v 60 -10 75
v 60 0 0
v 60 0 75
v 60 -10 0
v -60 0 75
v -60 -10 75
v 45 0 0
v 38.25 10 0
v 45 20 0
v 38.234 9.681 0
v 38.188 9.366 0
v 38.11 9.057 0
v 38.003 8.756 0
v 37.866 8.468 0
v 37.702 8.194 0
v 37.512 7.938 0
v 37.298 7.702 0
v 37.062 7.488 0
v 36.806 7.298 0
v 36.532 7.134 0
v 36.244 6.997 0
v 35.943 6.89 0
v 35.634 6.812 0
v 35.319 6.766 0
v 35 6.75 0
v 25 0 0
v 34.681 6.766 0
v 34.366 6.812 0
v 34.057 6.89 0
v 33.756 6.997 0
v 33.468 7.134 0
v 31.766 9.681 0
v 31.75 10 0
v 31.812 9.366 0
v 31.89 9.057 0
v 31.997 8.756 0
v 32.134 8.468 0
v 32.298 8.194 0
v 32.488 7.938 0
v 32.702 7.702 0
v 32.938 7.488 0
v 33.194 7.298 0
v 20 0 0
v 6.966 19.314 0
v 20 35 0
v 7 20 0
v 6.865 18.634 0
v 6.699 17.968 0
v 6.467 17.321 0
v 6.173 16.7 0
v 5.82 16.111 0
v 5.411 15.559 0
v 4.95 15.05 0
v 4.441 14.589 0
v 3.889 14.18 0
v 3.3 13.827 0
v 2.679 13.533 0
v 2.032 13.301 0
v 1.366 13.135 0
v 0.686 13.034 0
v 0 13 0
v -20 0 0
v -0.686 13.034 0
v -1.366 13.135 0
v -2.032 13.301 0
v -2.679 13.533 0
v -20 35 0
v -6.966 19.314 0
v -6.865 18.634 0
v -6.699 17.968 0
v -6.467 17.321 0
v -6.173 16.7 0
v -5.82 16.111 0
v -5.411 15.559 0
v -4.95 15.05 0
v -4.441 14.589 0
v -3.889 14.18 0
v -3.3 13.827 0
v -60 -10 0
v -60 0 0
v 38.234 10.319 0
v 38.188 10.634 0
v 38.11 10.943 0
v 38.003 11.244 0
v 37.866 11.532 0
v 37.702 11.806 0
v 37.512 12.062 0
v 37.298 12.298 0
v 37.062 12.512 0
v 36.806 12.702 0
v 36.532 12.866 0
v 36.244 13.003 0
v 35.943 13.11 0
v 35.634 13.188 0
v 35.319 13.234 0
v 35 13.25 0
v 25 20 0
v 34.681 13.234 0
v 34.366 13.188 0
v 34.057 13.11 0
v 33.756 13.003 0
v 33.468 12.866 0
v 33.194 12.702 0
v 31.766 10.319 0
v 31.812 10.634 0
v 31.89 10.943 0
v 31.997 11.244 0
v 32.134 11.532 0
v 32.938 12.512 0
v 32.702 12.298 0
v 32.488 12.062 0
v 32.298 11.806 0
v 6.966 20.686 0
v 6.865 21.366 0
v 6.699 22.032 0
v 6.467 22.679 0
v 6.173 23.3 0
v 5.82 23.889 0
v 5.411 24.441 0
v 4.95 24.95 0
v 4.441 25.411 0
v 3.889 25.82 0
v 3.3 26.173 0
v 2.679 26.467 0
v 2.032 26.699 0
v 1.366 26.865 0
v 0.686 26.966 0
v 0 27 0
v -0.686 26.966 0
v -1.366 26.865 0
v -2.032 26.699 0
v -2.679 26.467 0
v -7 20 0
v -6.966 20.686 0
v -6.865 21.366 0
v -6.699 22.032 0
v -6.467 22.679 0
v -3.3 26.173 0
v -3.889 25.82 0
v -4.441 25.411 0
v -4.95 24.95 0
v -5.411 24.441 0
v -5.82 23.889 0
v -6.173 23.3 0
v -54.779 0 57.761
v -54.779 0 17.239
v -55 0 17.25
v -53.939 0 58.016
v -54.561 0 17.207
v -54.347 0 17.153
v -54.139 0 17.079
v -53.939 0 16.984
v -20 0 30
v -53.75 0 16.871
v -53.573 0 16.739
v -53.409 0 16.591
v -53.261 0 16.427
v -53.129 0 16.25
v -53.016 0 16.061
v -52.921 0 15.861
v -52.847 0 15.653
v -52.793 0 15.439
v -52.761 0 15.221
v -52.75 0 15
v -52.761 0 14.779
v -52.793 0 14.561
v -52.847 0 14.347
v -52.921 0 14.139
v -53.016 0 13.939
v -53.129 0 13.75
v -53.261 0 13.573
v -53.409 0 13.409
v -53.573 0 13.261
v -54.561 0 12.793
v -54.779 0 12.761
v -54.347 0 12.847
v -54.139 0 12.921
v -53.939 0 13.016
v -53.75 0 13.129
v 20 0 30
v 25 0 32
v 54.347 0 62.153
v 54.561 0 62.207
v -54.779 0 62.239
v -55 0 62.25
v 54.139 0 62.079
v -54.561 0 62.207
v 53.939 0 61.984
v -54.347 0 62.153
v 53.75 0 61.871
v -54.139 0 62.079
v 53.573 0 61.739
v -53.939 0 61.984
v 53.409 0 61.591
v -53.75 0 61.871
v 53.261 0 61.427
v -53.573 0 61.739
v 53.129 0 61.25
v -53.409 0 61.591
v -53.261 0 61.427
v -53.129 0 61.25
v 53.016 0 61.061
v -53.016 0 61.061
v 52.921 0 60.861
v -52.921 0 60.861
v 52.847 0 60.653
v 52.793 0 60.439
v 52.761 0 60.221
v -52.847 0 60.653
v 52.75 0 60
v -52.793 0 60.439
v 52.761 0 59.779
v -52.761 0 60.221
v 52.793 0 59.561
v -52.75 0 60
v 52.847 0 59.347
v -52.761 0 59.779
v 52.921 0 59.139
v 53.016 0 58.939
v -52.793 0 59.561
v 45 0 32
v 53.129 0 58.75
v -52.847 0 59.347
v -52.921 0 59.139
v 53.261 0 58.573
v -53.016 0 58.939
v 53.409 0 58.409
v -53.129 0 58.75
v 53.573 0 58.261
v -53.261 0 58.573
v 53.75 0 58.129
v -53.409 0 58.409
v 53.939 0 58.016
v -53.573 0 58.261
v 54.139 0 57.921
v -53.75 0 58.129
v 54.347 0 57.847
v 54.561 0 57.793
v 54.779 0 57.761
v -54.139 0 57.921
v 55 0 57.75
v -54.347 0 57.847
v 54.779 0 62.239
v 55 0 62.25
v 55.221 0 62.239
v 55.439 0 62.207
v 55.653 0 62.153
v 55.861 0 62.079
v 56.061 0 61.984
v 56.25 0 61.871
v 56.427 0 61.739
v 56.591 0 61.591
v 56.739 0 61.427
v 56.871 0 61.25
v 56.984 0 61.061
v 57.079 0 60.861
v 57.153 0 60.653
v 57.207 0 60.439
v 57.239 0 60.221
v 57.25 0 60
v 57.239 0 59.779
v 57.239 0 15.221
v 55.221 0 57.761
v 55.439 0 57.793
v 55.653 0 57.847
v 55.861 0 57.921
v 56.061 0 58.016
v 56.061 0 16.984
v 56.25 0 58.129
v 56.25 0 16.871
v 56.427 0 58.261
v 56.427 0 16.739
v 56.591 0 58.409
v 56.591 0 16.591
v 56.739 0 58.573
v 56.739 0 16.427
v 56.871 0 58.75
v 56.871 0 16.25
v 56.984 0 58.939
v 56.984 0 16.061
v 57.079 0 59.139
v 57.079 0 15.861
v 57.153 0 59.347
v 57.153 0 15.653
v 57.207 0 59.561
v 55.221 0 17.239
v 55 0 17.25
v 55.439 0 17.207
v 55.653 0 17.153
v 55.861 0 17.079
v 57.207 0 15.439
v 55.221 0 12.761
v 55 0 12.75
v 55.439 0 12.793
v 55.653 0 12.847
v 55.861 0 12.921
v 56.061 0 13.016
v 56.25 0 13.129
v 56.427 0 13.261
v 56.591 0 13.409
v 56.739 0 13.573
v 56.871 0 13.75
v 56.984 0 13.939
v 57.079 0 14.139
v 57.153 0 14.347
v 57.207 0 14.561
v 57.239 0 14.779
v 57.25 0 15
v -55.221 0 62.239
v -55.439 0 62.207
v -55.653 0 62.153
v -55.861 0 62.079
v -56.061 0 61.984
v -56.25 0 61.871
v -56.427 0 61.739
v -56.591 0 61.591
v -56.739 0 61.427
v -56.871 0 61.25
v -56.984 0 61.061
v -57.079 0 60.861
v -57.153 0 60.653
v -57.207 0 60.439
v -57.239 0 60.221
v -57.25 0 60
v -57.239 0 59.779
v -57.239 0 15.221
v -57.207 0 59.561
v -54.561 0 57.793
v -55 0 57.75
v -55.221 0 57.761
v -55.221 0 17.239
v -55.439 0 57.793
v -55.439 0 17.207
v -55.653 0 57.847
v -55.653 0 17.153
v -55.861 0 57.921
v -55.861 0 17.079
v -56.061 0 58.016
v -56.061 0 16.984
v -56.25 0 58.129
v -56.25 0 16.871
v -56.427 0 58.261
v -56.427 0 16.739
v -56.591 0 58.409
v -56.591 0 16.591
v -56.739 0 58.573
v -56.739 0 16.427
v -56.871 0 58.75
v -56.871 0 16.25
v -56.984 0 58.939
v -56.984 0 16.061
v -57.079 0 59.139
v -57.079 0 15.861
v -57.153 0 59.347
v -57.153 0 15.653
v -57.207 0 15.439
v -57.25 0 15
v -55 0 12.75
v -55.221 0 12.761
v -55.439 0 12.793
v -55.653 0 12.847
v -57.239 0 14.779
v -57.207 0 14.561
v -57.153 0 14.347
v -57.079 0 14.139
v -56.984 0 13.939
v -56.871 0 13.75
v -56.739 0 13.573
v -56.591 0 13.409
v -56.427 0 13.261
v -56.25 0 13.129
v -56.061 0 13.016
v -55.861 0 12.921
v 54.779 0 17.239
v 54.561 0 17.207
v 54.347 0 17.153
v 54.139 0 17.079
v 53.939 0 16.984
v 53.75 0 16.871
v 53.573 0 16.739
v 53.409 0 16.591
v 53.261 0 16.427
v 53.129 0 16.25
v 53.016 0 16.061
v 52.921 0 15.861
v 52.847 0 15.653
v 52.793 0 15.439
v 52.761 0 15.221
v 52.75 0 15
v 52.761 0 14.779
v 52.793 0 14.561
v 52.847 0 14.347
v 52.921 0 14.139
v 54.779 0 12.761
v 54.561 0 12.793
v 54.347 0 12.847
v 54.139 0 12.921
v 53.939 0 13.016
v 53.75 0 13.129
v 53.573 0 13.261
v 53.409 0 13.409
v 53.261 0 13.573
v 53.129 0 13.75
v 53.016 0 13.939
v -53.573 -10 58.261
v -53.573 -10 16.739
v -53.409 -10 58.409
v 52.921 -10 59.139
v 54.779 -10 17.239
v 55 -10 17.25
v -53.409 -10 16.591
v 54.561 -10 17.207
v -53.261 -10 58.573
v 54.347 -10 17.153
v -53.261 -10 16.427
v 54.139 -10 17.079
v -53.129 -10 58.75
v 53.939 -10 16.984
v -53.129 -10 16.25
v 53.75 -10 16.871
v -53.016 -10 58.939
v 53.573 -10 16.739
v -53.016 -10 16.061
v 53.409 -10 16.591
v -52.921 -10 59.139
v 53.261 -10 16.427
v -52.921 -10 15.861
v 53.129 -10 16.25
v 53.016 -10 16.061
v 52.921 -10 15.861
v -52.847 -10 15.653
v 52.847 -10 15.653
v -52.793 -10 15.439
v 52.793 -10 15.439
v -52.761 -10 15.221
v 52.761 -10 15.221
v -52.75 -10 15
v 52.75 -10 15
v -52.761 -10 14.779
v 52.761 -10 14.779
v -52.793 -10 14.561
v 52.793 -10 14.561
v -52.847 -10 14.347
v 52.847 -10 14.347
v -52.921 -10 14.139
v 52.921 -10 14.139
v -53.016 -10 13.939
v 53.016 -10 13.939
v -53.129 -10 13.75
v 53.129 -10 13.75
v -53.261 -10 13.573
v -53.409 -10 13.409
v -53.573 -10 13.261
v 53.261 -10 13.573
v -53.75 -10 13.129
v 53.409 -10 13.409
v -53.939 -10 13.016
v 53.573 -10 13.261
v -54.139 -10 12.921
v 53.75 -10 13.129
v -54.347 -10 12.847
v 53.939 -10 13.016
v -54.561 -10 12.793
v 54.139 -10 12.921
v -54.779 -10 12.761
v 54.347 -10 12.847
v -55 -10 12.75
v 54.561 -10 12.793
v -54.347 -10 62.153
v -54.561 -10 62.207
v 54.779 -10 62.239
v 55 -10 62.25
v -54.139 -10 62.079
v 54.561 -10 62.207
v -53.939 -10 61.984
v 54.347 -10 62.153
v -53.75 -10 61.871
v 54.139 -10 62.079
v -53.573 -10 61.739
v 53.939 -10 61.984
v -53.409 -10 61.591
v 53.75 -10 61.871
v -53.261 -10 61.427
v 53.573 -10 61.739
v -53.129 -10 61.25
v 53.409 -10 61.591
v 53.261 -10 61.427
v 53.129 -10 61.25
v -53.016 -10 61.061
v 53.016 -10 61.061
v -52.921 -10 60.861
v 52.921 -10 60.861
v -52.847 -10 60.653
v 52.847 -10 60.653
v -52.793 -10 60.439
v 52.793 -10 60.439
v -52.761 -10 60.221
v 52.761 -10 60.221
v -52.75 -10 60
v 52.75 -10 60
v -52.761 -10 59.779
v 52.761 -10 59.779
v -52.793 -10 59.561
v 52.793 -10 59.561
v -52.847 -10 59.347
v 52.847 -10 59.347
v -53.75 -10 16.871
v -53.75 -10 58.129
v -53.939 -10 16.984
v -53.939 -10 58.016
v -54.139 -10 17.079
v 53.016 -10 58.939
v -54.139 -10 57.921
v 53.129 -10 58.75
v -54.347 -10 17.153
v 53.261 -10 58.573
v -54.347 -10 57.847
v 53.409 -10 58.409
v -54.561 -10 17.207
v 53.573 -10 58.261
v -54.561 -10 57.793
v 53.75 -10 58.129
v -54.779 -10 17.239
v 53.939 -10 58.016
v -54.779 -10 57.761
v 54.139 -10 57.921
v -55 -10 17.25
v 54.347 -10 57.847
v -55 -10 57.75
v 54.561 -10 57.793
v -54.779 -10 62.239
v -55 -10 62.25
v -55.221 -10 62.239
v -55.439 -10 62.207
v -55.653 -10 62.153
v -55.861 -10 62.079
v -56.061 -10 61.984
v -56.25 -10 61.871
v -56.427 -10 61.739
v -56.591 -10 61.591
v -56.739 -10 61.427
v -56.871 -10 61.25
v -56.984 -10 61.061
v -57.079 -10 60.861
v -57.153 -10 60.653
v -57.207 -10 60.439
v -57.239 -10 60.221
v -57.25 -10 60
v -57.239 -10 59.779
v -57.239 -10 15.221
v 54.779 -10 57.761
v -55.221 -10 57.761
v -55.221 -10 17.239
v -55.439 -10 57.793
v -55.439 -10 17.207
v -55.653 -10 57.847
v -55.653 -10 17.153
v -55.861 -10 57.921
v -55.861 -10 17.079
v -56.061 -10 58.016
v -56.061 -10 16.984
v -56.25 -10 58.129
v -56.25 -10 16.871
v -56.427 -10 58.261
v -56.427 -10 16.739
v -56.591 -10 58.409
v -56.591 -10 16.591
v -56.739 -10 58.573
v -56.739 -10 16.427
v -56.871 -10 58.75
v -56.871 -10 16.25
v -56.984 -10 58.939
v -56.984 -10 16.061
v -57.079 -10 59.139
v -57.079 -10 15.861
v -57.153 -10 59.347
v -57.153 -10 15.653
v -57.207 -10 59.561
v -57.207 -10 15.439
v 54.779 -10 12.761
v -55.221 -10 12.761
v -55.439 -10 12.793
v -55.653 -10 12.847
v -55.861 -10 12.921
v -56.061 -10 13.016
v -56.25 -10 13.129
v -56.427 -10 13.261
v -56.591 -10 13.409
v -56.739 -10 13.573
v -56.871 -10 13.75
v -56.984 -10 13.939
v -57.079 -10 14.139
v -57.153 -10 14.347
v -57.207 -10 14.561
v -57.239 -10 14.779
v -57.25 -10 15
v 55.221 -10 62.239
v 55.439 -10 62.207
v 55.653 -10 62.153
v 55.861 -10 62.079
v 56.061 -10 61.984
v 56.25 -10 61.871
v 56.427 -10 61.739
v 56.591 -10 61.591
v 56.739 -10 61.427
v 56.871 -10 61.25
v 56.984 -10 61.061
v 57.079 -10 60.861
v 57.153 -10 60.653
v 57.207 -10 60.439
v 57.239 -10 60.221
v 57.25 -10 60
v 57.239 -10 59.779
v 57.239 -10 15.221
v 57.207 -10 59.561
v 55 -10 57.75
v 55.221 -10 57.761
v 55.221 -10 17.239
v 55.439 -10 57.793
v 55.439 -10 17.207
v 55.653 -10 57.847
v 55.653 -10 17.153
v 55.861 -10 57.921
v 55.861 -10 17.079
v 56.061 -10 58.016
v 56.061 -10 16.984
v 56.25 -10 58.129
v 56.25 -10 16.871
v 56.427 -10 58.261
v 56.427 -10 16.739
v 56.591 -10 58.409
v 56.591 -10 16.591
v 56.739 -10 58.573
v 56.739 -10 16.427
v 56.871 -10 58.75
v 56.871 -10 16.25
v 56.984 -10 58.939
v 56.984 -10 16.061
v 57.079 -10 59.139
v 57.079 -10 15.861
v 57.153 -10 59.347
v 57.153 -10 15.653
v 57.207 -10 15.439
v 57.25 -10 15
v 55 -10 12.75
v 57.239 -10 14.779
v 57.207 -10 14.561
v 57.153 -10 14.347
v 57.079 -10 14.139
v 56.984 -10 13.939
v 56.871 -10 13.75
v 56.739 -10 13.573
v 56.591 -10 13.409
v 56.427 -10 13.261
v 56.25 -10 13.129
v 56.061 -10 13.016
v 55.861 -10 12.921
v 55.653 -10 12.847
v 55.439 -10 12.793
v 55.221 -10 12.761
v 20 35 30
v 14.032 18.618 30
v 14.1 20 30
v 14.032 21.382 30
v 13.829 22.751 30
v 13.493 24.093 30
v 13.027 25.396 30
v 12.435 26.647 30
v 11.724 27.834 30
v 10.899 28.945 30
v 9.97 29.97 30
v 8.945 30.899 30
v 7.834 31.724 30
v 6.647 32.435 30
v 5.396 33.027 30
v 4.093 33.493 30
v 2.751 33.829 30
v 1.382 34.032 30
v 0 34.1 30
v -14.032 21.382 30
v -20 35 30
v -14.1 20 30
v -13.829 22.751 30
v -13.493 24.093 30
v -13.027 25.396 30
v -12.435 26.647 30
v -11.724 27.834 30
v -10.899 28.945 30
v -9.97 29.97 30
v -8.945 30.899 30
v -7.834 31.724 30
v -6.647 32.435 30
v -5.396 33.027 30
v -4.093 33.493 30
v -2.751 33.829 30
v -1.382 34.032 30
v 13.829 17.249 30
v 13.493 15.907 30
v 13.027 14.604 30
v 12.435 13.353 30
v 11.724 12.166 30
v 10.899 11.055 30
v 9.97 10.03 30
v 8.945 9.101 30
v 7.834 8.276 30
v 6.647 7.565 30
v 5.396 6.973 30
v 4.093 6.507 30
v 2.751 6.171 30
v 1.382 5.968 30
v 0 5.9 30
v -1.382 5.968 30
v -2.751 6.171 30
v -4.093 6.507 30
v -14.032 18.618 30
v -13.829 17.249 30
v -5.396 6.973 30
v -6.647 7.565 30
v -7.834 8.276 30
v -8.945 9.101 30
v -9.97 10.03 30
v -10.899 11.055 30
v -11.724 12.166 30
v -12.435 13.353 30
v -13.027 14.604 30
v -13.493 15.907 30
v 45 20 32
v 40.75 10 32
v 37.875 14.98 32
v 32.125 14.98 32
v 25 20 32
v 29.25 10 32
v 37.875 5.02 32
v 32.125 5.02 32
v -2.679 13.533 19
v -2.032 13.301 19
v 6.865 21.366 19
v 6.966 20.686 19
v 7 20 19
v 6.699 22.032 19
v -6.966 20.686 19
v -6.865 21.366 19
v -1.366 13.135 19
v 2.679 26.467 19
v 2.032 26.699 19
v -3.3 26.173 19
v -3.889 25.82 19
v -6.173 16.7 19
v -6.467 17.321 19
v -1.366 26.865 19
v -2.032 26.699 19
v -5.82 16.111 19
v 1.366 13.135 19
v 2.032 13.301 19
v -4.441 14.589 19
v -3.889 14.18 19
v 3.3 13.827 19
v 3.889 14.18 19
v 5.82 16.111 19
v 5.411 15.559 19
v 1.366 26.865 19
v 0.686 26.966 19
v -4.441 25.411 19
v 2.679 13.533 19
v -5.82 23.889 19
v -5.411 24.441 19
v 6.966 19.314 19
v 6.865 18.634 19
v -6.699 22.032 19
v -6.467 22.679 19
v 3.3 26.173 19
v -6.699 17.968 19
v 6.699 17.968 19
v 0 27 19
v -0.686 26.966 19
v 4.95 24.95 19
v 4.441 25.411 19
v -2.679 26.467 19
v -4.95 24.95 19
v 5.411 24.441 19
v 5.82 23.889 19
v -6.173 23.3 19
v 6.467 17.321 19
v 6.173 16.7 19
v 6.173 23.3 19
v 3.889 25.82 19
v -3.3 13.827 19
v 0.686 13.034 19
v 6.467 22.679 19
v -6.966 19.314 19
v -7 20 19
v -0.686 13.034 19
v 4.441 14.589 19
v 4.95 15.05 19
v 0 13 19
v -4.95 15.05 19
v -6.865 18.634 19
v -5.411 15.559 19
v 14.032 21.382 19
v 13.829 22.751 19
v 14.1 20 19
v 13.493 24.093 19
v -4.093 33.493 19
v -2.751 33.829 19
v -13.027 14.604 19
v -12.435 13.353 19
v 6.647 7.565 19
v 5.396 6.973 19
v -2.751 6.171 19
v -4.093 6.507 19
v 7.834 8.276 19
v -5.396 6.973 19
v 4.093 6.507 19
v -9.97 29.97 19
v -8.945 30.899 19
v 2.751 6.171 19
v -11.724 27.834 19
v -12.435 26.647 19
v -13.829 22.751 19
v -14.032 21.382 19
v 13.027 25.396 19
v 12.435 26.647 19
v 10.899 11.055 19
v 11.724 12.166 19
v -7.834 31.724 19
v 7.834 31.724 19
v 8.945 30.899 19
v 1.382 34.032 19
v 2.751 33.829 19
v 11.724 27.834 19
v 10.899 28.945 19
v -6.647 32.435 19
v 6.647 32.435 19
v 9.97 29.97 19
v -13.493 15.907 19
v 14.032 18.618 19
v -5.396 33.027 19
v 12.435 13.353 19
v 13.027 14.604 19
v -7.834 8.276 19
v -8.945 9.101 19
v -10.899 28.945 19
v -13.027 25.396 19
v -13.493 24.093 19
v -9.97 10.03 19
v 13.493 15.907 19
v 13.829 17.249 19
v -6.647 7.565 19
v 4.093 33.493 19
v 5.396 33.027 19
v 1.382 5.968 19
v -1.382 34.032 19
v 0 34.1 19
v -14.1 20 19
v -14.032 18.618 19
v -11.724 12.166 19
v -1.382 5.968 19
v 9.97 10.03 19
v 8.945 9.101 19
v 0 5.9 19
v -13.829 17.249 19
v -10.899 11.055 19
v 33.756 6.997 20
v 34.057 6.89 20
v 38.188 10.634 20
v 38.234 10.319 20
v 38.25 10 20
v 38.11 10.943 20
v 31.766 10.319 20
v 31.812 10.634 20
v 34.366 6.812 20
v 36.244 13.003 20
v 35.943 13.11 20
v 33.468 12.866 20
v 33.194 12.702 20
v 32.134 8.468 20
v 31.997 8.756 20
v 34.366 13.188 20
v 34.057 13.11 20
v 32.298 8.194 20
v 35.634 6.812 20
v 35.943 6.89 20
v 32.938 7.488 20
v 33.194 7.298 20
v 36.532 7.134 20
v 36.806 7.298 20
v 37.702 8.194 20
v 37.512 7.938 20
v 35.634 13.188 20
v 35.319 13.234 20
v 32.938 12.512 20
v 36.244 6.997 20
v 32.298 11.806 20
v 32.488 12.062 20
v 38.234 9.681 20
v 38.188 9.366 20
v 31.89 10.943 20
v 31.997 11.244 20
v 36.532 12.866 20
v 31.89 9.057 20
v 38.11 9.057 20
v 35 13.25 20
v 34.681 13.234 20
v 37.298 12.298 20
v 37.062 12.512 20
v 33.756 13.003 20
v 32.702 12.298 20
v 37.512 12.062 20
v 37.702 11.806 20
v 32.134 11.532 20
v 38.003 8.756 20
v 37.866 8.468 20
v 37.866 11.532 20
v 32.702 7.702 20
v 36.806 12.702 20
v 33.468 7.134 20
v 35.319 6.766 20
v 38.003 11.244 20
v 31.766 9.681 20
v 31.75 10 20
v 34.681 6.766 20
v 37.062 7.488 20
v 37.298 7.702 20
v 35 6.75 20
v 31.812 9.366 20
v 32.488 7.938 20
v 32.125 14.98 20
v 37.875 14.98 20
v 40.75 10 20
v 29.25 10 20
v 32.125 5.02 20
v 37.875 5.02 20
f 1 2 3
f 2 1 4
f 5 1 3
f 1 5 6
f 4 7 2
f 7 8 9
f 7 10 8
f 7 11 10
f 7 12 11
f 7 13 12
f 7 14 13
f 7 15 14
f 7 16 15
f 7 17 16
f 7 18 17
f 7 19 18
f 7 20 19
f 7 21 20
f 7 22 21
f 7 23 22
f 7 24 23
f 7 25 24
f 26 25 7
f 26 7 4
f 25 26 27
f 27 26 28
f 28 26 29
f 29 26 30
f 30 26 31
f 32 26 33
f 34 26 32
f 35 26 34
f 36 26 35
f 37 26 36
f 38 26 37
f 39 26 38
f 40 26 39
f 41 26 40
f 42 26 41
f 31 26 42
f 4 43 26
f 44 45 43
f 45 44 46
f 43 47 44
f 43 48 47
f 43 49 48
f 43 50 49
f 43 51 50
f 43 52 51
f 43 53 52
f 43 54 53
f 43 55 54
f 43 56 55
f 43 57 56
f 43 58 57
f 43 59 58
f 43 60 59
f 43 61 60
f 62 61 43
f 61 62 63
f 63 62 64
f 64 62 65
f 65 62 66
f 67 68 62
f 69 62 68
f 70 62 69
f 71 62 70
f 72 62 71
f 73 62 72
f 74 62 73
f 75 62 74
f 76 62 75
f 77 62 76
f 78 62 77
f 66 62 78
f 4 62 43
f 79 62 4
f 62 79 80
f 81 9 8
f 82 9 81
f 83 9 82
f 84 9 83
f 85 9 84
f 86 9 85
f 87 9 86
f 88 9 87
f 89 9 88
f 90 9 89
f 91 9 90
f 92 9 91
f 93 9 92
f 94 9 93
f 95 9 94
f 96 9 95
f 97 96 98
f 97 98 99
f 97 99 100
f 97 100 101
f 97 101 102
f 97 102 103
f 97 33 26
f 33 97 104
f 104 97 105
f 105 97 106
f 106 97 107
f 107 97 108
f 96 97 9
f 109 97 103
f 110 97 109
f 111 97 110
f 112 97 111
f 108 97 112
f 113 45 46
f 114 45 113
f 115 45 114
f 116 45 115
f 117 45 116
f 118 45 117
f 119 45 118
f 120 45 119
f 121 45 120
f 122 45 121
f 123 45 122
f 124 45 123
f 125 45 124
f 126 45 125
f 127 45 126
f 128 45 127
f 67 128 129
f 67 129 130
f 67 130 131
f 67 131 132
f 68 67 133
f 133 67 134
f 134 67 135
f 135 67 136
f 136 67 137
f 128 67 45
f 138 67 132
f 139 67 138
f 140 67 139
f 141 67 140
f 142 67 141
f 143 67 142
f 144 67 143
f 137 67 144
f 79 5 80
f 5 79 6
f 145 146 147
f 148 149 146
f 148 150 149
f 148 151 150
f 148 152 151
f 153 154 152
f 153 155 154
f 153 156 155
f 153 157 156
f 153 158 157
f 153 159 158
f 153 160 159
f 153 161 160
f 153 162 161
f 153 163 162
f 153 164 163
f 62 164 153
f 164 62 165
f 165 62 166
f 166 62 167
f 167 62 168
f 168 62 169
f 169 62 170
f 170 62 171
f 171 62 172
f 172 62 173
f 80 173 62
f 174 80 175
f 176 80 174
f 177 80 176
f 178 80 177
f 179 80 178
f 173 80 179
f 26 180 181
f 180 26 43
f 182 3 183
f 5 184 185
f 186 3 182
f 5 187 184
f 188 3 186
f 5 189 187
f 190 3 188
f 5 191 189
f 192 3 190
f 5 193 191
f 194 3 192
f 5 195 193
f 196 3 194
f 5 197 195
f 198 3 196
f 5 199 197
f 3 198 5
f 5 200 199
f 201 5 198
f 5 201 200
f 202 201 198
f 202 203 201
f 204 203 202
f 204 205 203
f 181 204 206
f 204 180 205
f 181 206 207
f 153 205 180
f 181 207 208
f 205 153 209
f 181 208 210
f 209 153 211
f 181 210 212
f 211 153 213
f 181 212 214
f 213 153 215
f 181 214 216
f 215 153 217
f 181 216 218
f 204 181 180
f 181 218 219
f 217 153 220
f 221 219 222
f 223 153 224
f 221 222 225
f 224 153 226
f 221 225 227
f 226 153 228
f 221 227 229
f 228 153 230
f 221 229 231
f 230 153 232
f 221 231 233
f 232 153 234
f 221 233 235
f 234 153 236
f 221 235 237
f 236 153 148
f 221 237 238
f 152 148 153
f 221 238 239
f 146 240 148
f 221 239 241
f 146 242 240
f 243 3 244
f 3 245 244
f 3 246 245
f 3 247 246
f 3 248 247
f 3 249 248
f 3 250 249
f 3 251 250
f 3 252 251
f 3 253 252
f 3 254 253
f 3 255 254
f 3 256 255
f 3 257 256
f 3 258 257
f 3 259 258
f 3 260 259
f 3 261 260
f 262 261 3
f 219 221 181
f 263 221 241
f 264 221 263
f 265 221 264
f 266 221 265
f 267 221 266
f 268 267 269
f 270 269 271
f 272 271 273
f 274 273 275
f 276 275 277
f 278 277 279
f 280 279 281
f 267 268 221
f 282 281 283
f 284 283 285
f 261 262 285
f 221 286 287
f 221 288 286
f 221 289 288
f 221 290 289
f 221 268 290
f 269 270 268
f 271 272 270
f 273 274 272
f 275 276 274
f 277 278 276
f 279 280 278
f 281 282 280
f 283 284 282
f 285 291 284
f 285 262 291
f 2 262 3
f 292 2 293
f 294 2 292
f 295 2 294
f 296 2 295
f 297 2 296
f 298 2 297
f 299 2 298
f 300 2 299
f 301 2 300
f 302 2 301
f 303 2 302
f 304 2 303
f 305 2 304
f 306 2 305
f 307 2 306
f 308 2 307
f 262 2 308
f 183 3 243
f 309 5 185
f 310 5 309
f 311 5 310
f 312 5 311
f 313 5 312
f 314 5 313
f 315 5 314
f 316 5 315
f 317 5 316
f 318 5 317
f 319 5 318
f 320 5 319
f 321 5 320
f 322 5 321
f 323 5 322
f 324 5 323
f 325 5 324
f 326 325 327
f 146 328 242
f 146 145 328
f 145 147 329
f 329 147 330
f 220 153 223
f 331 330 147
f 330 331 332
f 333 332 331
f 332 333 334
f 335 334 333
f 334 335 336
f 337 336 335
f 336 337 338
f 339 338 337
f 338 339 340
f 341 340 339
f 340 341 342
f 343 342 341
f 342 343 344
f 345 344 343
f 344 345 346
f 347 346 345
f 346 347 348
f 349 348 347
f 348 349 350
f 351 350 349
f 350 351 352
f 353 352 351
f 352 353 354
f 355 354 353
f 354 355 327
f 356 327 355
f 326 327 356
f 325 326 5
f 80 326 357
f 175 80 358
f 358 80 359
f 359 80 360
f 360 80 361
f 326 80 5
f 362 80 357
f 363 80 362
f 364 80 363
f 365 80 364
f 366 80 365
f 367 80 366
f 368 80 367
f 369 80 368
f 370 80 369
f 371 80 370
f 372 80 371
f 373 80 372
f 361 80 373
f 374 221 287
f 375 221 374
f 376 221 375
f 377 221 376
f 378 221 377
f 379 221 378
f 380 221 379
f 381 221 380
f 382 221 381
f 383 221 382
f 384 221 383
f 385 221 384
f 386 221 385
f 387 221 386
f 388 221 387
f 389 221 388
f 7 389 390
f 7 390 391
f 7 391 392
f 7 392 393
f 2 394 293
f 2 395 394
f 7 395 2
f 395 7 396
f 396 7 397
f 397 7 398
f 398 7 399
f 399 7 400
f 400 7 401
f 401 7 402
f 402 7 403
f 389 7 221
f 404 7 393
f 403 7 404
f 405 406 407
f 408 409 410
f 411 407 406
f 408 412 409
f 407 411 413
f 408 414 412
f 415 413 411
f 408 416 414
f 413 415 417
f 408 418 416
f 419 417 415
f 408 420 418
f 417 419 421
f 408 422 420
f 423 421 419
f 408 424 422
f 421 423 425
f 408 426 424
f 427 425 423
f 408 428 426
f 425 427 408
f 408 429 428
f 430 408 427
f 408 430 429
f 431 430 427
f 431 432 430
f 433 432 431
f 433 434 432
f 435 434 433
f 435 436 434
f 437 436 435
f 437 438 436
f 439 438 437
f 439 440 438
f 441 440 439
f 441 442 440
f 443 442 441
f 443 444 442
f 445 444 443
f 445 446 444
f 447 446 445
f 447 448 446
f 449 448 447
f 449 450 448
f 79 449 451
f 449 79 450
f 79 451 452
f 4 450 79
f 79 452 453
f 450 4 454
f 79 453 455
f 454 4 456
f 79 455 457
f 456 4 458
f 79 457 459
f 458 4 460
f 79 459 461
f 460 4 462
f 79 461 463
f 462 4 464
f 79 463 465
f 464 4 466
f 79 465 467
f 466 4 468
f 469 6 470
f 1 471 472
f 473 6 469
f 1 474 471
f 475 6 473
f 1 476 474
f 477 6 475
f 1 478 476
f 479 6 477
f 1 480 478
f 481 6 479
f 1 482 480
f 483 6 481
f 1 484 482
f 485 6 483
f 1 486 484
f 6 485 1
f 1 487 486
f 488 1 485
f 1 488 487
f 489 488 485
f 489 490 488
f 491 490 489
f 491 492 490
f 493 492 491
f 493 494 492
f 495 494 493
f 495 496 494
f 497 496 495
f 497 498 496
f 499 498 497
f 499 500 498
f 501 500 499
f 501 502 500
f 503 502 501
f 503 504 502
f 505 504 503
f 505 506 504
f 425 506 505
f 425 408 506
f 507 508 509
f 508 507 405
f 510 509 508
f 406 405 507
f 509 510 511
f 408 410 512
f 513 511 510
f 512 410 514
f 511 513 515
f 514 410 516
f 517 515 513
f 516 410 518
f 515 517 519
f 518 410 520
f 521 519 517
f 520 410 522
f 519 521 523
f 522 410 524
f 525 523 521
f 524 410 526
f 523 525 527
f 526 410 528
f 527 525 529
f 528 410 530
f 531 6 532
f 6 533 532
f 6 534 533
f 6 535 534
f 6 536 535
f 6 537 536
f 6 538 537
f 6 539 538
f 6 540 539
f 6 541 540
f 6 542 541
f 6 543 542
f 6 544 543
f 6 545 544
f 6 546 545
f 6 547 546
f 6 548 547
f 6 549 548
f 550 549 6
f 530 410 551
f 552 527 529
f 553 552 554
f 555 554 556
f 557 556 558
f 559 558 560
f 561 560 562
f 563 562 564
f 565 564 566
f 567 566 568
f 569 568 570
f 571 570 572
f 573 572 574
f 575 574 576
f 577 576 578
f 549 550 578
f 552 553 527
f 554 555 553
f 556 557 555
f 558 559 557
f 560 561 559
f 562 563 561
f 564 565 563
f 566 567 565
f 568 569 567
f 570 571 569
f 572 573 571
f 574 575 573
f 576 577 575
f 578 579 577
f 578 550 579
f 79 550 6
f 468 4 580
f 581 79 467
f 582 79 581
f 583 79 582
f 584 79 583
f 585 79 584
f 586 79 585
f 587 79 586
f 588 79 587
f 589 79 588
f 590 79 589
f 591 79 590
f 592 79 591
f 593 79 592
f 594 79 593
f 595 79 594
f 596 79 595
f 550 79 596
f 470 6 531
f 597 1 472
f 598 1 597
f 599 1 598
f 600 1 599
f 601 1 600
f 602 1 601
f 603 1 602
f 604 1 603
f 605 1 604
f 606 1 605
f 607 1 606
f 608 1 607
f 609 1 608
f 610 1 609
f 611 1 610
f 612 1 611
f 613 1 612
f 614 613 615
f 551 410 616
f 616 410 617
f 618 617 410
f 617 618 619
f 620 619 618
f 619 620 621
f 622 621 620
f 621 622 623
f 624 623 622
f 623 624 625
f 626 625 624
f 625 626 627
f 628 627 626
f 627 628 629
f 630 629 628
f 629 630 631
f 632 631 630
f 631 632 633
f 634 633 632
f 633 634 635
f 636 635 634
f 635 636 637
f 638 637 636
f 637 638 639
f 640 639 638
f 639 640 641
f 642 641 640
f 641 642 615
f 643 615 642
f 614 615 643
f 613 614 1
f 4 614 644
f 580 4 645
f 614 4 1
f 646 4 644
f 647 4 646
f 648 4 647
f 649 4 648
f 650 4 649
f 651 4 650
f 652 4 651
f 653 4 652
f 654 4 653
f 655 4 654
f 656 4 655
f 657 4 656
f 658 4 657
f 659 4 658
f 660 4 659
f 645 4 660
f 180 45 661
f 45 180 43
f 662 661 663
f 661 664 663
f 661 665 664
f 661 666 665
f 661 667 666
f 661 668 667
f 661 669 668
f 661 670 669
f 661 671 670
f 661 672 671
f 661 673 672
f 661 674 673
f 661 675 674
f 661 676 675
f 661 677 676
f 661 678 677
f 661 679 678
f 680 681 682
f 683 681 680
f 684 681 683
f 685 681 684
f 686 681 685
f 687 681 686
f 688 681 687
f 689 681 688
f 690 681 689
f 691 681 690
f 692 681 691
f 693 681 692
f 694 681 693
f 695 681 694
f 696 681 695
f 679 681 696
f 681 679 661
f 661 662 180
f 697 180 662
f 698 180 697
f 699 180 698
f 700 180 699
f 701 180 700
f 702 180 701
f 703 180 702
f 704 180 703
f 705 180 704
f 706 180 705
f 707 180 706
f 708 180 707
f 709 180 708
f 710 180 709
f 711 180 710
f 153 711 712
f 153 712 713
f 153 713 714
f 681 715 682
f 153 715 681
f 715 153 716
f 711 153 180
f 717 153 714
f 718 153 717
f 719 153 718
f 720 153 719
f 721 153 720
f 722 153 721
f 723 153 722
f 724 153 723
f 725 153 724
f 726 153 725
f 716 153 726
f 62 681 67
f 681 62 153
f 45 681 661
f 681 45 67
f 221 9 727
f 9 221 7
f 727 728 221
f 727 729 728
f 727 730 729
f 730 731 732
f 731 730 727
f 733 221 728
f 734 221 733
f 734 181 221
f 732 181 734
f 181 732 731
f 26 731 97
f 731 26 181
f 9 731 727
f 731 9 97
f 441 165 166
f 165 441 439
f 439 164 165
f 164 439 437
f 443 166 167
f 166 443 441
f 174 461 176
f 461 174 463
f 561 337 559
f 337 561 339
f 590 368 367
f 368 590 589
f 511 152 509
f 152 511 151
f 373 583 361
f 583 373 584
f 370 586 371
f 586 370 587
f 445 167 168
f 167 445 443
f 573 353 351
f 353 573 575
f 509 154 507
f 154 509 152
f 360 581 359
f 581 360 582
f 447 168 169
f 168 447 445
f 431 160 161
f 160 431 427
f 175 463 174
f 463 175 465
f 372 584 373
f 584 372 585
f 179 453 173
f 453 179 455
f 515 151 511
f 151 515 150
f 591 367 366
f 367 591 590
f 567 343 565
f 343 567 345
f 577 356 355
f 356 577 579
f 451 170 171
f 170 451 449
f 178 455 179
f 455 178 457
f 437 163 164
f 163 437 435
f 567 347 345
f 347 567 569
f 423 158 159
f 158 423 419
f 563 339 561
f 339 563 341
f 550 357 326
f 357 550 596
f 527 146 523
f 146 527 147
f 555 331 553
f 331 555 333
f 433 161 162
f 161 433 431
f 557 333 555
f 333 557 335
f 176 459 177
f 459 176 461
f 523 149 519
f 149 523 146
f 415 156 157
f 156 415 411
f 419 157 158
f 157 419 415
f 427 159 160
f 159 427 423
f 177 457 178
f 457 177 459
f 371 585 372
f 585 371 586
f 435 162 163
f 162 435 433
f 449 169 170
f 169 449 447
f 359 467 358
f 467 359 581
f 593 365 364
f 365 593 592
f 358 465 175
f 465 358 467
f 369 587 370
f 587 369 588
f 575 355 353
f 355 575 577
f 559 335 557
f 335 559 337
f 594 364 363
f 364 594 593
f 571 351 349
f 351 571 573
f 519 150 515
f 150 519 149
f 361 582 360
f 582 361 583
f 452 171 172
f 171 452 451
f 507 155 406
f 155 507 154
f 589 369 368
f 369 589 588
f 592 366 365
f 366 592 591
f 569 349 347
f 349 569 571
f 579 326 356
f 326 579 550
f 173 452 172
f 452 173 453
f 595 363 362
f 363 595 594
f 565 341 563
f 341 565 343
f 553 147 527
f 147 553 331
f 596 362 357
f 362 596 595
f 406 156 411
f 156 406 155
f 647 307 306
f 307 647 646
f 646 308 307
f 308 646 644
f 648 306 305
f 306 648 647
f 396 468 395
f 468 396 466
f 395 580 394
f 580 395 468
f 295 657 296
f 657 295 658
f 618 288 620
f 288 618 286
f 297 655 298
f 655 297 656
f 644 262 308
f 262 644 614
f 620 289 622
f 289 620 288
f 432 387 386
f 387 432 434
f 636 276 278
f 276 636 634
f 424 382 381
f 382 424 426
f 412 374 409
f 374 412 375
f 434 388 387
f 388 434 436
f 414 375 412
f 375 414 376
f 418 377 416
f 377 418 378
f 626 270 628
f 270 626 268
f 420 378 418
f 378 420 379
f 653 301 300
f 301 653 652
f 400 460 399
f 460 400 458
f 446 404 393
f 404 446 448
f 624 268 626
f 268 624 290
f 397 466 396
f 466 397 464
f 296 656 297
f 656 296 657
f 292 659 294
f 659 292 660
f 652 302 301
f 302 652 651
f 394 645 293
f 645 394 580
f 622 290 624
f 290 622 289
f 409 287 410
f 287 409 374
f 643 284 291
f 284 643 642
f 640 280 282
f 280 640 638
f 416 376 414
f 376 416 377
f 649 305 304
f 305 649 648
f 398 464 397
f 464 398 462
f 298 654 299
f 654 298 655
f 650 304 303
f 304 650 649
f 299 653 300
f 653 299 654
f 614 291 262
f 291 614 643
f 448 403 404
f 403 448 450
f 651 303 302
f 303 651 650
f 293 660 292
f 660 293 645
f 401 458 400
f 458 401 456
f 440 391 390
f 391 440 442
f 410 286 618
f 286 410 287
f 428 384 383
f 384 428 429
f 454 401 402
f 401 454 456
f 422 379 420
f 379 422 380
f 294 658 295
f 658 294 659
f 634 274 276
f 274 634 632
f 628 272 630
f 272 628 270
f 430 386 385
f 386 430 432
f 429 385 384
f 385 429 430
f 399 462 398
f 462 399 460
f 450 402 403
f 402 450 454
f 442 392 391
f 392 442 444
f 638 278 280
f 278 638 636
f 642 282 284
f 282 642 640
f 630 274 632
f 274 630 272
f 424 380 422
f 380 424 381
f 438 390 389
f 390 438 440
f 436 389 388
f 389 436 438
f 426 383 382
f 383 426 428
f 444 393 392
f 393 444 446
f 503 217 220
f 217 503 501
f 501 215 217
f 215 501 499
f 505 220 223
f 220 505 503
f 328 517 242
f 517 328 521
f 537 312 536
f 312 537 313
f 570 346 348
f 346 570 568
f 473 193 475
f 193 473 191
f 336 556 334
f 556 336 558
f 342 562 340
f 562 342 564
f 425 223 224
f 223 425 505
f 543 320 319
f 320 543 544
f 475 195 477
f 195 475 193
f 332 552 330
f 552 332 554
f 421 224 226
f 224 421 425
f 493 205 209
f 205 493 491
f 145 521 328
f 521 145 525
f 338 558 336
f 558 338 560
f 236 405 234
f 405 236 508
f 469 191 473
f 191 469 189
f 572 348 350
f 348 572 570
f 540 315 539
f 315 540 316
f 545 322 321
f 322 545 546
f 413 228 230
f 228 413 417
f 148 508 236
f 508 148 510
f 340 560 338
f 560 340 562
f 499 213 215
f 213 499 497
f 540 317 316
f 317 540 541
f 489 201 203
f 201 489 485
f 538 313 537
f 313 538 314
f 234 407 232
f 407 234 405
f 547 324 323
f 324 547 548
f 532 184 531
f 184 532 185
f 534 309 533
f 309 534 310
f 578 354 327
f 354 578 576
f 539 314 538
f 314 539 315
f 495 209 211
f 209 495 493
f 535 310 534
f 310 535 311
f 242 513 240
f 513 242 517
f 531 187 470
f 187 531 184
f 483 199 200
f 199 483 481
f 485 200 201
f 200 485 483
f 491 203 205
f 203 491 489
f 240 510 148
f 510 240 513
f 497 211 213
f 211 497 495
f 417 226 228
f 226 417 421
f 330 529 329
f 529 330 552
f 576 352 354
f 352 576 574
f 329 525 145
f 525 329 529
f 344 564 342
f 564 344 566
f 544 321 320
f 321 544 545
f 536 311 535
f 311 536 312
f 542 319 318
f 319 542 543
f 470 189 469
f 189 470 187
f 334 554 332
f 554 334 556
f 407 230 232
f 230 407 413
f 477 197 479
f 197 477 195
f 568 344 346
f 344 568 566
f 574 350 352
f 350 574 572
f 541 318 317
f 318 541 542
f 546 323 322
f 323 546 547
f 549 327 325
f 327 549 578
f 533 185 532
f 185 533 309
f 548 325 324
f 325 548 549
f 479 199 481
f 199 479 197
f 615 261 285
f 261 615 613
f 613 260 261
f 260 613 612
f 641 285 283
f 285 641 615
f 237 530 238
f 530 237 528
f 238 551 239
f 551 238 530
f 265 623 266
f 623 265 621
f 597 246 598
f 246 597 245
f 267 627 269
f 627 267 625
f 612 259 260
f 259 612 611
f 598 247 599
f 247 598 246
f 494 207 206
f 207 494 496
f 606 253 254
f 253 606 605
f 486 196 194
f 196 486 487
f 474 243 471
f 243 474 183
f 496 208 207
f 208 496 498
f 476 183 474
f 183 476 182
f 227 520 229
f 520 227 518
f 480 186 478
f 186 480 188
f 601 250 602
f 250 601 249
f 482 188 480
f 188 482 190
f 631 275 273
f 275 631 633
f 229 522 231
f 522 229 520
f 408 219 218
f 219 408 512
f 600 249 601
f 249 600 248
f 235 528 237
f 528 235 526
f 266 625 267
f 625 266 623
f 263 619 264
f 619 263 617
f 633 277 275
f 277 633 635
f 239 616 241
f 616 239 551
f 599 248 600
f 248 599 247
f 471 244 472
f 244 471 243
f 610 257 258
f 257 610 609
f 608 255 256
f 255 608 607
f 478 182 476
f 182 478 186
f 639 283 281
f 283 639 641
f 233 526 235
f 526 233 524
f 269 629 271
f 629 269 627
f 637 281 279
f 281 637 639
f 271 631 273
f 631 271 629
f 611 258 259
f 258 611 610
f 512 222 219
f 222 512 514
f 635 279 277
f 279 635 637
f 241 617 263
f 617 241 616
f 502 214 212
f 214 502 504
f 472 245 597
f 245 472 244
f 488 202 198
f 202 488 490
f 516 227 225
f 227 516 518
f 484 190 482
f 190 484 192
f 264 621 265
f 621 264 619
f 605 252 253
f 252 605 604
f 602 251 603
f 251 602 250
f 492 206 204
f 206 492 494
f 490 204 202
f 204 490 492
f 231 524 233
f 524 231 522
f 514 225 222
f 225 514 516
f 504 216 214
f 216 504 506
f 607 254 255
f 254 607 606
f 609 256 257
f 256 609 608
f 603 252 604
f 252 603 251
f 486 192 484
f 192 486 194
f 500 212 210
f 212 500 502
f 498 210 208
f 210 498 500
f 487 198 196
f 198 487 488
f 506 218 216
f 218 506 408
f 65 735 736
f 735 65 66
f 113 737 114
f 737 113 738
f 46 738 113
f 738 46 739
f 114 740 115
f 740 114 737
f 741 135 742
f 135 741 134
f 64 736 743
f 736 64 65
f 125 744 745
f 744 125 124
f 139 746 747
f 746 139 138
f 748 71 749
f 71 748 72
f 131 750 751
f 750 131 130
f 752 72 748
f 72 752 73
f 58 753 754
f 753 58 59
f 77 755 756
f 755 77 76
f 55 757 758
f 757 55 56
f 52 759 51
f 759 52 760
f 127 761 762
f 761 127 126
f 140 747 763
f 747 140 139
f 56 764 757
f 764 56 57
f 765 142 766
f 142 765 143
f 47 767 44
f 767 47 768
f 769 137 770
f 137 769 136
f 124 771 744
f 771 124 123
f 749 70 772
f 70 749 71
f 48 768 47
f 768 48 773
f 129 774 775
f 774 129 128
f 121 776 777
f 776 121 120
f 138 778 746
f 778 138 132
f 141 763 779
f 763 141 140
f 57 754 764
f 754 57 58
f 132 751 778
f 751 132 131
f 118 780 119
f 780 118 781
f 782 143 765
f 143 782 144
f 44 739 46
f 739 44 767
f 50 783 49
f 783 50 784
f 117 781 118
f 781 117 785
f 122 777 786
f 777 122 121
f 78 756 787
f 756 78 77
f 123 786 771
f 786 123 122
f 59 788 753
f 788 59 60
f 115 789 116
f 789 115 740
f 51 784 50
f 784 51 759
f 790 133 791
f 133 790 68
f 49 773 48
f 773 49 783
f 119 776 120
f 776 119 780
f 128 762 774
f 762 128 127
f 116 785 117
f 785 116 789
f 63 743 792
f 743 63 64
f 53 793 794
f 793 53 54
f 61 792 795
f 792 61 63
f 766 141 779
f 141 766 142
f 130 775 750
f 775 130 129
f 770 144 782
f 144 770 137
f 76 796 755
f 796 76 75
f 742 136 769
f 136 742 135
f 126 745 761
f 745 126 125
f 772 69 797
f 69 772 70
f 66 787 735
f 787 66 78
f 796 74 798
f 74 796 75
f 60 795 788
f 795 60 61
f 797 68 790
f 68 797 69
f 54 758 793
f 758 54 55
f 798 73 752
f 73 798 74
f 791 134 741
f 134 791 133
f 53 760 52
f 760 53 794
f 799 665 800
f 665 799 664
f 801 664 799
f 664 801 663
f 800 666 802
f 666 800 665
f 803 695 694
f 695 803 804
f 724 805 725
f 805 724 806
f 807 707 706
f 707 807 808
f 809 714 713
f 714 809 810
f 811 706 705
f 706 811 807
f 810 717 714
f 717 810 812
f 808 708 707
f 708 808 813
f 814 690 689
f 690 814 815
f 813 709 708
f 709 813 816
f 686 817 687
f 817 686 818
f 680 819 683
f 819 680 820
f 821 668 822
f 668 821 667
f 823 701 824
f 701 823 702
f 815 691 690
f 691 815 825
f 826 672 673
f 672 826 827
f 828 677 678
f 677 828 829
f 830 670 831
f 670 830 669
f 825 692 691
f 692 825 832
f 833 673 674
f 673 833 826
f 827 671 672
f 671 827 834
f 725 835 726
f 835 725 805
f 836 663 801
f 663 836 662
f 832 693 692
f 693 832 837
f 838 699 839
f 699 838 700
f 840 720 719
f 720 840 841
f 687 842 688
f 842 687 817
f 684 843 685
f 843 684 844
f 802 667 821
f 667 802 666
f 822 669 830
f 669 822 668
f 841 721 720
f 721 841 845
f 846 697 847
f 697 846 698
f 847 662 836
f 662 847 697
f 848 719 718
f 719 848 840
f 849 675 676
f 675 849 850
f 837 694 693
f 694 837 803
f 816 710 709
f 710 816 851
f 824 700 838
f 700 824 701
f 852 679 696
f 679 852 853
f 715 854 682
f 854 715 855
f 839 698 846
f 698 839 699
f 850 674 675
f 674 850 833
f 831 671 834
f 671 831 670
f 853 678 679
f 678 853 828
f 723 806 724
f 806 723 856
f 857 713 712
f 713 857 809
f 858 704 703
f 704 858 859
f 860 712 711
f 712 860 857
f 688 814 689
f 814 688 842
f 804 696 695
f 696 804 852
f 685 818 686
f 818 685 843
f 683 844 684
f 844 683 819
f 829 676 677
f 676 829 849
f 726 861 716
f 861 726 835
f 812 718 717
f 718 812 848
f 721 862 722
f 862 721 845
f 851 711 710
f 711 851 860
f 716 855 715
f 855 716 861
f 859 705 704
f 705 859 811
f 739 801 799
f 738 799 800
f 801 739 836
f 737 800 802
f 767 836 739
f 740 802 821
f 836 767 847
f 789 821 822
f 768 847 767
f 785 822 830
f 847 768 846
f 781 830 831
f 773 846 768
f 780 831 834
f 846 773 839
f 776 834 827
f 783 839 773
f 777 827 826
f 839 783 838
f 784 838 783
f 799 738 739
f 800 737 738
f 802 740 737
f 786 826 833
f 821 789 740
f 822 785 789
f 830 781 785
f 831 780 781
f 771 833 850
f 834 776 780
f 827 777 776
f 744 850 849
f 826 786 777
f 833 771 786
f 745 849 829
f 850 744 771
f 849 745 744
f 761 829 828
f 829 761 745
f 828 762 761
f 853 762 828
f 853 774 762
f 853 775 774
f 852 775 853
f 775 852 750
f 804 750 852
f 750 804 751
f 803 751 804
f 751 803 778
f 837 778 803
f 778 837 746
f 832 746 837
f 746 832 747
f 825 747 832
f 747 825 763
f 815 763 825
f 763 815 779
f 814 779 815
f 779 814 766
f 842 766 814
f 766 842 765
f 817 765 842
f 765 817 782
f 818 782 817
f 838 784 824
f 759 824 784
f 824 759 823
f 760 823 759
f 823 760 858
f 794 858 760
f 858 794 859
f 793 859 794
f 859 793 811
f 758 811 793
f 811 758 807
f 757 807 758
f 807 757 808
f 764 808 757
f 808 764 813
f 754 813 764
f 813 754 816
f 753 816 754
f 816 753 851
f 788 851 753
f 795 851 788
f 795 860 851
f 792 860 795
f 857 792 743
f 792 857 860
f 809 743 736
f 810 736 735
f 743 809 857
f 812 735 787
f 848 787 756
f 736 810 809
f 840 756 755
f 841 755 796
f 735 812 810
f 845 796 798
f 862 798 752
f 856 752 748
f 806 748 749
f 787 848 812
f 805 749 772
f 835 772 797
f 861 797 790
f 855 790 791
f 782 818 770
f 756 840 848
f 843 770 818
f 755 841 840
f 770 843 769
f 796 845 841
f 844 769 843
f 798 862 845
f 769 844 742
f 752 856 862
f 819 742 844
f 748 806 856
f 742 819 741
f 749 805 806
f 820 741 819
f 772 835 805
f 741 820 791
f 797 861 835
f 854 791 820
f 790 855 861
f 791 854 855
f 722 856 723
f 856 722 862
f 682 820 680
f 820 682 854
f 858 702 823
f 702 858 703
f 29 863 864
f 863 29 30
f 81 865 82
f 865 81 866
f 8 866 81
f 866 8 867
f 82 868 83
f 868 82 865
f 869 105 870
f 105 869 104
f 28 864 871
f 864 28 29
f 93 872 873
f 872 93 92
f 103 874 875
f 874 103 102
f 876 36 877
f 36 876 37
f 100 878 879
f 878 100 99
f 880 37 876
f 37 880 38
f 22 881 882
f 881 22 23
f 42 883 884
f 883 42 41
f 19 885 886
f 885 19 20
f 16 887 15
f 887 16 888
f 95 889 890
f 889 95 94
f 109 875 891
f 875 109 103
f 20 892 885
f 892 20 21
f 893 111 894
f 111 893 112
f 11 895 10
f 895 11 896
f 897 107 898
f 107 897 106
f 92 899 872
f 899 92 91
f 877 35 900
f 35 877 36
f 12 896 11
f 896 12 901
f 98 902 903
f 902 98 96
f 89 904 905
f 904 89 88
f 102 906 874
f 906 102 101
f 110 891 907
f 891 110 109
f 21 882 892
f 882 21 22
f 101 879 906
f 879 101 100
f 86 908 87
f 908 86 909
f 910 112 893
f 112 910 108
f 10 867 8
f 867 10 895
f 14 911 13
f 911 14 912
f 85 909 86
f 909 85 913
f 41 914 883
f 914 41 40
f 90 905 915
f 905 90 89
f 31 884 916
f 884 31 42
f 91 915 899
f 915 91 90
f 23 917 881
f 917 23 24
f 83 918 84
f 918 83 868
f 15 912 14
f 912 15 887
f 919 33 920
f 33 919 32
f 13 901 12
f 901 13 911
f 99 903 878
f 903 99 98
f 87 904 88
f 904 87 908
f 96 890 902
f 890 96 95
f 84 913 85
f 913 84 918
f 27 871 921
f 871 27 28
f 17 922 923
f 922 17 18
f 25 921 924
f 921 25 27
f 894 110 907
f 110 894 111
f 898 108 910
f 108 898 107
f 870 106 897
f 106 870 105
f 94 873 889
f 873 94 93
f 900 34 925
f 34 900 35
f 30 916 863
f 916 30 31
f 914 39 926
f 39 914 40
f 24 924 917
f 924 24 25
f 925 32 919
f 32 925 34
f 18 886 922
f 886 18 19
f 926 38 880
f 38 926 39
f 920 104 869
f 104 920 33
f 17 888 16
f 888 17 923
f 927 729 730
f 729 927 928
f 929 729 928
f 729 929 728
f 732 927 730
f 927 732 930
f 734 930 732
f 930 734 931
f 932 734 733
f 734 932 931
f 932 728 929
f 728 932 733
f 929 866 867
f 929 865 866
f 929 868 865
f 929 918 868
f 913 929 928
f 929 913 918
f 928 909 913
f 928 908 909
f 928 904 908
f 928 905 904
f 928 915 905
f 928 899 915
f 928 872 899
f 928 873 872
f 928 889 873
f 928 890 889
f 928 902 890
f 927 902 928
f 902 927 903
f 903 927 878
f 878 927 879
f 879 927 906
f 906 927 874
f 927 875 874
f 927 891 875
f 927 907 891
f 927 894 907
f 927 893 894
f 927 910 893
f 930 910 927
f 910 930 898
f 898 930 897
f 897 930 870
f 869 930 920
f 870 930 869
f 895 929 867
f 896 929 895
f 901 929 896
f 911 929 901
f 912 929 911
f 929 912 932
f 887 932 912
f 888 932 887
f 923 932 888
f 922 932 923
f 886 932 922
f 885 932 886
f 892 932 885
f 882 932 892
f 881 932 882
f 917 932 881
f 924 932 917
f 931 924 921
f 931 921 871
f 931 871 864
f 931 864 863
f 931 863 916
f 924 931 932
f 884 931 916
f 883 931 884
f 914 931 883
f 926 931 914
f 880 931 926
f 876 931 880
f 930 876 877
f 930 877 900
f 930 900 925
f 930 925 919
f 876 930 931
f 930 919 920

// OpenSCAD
// --- TODMORDEN TOP ALIGNMENT MOUNT (OUTBOARD HOLES) ---
$fn = 64;

// Parameters
bearing_od = 28.2;   
rod_spacing = 35.0;  
timber_w = 75.0;     

module top_alignment_mount_v2() {
    difference() {
        union() {
            // 1. BACKPLATE (120mm wide)
            translate([-60, -10, 0]) cube([120, 10, timber_w]);
            
            // 2. M12 BEARING HOUSING
            translate([-20, 0, 0]) cube([40, 35, 30]);
            
            // 3. M6 GUIDE ROD SUPPORT
            translate([rod_spacing - 10, 0, 0]) cube([20, 20, 32]);
        }

        // --- M12 ROD & BEARING SEAT ---
        translate([0, 20, -1]) cylinder(d=14, h=50); 
        translate([0, 20, 19]) cylinder(d=bearing_od, h=12); // Bearing at top

        // --- M6 GUIDE ROD ANCHOR ---
        translate([rod_spacing, 10, -1]) cylinder(d=6.5, h=50);
        translate([rod_spacing, 10, 20]) cylinder(d=11.5, h=13, $fn=6); // Nut Trap

        // --- 4x TIMBER MOUNTING HOLES (Shifted 10mm Outward) ---
        // Holes moved from +/- 45mm to +/- 55mm
        for(z=[15, 60], x=[-55, 55])
            translate([x, -11, z]) rotate([-90, 0, 0]) cylinder(d=4.5, h=25);
    }
}

top_alignment_mount_v2();
